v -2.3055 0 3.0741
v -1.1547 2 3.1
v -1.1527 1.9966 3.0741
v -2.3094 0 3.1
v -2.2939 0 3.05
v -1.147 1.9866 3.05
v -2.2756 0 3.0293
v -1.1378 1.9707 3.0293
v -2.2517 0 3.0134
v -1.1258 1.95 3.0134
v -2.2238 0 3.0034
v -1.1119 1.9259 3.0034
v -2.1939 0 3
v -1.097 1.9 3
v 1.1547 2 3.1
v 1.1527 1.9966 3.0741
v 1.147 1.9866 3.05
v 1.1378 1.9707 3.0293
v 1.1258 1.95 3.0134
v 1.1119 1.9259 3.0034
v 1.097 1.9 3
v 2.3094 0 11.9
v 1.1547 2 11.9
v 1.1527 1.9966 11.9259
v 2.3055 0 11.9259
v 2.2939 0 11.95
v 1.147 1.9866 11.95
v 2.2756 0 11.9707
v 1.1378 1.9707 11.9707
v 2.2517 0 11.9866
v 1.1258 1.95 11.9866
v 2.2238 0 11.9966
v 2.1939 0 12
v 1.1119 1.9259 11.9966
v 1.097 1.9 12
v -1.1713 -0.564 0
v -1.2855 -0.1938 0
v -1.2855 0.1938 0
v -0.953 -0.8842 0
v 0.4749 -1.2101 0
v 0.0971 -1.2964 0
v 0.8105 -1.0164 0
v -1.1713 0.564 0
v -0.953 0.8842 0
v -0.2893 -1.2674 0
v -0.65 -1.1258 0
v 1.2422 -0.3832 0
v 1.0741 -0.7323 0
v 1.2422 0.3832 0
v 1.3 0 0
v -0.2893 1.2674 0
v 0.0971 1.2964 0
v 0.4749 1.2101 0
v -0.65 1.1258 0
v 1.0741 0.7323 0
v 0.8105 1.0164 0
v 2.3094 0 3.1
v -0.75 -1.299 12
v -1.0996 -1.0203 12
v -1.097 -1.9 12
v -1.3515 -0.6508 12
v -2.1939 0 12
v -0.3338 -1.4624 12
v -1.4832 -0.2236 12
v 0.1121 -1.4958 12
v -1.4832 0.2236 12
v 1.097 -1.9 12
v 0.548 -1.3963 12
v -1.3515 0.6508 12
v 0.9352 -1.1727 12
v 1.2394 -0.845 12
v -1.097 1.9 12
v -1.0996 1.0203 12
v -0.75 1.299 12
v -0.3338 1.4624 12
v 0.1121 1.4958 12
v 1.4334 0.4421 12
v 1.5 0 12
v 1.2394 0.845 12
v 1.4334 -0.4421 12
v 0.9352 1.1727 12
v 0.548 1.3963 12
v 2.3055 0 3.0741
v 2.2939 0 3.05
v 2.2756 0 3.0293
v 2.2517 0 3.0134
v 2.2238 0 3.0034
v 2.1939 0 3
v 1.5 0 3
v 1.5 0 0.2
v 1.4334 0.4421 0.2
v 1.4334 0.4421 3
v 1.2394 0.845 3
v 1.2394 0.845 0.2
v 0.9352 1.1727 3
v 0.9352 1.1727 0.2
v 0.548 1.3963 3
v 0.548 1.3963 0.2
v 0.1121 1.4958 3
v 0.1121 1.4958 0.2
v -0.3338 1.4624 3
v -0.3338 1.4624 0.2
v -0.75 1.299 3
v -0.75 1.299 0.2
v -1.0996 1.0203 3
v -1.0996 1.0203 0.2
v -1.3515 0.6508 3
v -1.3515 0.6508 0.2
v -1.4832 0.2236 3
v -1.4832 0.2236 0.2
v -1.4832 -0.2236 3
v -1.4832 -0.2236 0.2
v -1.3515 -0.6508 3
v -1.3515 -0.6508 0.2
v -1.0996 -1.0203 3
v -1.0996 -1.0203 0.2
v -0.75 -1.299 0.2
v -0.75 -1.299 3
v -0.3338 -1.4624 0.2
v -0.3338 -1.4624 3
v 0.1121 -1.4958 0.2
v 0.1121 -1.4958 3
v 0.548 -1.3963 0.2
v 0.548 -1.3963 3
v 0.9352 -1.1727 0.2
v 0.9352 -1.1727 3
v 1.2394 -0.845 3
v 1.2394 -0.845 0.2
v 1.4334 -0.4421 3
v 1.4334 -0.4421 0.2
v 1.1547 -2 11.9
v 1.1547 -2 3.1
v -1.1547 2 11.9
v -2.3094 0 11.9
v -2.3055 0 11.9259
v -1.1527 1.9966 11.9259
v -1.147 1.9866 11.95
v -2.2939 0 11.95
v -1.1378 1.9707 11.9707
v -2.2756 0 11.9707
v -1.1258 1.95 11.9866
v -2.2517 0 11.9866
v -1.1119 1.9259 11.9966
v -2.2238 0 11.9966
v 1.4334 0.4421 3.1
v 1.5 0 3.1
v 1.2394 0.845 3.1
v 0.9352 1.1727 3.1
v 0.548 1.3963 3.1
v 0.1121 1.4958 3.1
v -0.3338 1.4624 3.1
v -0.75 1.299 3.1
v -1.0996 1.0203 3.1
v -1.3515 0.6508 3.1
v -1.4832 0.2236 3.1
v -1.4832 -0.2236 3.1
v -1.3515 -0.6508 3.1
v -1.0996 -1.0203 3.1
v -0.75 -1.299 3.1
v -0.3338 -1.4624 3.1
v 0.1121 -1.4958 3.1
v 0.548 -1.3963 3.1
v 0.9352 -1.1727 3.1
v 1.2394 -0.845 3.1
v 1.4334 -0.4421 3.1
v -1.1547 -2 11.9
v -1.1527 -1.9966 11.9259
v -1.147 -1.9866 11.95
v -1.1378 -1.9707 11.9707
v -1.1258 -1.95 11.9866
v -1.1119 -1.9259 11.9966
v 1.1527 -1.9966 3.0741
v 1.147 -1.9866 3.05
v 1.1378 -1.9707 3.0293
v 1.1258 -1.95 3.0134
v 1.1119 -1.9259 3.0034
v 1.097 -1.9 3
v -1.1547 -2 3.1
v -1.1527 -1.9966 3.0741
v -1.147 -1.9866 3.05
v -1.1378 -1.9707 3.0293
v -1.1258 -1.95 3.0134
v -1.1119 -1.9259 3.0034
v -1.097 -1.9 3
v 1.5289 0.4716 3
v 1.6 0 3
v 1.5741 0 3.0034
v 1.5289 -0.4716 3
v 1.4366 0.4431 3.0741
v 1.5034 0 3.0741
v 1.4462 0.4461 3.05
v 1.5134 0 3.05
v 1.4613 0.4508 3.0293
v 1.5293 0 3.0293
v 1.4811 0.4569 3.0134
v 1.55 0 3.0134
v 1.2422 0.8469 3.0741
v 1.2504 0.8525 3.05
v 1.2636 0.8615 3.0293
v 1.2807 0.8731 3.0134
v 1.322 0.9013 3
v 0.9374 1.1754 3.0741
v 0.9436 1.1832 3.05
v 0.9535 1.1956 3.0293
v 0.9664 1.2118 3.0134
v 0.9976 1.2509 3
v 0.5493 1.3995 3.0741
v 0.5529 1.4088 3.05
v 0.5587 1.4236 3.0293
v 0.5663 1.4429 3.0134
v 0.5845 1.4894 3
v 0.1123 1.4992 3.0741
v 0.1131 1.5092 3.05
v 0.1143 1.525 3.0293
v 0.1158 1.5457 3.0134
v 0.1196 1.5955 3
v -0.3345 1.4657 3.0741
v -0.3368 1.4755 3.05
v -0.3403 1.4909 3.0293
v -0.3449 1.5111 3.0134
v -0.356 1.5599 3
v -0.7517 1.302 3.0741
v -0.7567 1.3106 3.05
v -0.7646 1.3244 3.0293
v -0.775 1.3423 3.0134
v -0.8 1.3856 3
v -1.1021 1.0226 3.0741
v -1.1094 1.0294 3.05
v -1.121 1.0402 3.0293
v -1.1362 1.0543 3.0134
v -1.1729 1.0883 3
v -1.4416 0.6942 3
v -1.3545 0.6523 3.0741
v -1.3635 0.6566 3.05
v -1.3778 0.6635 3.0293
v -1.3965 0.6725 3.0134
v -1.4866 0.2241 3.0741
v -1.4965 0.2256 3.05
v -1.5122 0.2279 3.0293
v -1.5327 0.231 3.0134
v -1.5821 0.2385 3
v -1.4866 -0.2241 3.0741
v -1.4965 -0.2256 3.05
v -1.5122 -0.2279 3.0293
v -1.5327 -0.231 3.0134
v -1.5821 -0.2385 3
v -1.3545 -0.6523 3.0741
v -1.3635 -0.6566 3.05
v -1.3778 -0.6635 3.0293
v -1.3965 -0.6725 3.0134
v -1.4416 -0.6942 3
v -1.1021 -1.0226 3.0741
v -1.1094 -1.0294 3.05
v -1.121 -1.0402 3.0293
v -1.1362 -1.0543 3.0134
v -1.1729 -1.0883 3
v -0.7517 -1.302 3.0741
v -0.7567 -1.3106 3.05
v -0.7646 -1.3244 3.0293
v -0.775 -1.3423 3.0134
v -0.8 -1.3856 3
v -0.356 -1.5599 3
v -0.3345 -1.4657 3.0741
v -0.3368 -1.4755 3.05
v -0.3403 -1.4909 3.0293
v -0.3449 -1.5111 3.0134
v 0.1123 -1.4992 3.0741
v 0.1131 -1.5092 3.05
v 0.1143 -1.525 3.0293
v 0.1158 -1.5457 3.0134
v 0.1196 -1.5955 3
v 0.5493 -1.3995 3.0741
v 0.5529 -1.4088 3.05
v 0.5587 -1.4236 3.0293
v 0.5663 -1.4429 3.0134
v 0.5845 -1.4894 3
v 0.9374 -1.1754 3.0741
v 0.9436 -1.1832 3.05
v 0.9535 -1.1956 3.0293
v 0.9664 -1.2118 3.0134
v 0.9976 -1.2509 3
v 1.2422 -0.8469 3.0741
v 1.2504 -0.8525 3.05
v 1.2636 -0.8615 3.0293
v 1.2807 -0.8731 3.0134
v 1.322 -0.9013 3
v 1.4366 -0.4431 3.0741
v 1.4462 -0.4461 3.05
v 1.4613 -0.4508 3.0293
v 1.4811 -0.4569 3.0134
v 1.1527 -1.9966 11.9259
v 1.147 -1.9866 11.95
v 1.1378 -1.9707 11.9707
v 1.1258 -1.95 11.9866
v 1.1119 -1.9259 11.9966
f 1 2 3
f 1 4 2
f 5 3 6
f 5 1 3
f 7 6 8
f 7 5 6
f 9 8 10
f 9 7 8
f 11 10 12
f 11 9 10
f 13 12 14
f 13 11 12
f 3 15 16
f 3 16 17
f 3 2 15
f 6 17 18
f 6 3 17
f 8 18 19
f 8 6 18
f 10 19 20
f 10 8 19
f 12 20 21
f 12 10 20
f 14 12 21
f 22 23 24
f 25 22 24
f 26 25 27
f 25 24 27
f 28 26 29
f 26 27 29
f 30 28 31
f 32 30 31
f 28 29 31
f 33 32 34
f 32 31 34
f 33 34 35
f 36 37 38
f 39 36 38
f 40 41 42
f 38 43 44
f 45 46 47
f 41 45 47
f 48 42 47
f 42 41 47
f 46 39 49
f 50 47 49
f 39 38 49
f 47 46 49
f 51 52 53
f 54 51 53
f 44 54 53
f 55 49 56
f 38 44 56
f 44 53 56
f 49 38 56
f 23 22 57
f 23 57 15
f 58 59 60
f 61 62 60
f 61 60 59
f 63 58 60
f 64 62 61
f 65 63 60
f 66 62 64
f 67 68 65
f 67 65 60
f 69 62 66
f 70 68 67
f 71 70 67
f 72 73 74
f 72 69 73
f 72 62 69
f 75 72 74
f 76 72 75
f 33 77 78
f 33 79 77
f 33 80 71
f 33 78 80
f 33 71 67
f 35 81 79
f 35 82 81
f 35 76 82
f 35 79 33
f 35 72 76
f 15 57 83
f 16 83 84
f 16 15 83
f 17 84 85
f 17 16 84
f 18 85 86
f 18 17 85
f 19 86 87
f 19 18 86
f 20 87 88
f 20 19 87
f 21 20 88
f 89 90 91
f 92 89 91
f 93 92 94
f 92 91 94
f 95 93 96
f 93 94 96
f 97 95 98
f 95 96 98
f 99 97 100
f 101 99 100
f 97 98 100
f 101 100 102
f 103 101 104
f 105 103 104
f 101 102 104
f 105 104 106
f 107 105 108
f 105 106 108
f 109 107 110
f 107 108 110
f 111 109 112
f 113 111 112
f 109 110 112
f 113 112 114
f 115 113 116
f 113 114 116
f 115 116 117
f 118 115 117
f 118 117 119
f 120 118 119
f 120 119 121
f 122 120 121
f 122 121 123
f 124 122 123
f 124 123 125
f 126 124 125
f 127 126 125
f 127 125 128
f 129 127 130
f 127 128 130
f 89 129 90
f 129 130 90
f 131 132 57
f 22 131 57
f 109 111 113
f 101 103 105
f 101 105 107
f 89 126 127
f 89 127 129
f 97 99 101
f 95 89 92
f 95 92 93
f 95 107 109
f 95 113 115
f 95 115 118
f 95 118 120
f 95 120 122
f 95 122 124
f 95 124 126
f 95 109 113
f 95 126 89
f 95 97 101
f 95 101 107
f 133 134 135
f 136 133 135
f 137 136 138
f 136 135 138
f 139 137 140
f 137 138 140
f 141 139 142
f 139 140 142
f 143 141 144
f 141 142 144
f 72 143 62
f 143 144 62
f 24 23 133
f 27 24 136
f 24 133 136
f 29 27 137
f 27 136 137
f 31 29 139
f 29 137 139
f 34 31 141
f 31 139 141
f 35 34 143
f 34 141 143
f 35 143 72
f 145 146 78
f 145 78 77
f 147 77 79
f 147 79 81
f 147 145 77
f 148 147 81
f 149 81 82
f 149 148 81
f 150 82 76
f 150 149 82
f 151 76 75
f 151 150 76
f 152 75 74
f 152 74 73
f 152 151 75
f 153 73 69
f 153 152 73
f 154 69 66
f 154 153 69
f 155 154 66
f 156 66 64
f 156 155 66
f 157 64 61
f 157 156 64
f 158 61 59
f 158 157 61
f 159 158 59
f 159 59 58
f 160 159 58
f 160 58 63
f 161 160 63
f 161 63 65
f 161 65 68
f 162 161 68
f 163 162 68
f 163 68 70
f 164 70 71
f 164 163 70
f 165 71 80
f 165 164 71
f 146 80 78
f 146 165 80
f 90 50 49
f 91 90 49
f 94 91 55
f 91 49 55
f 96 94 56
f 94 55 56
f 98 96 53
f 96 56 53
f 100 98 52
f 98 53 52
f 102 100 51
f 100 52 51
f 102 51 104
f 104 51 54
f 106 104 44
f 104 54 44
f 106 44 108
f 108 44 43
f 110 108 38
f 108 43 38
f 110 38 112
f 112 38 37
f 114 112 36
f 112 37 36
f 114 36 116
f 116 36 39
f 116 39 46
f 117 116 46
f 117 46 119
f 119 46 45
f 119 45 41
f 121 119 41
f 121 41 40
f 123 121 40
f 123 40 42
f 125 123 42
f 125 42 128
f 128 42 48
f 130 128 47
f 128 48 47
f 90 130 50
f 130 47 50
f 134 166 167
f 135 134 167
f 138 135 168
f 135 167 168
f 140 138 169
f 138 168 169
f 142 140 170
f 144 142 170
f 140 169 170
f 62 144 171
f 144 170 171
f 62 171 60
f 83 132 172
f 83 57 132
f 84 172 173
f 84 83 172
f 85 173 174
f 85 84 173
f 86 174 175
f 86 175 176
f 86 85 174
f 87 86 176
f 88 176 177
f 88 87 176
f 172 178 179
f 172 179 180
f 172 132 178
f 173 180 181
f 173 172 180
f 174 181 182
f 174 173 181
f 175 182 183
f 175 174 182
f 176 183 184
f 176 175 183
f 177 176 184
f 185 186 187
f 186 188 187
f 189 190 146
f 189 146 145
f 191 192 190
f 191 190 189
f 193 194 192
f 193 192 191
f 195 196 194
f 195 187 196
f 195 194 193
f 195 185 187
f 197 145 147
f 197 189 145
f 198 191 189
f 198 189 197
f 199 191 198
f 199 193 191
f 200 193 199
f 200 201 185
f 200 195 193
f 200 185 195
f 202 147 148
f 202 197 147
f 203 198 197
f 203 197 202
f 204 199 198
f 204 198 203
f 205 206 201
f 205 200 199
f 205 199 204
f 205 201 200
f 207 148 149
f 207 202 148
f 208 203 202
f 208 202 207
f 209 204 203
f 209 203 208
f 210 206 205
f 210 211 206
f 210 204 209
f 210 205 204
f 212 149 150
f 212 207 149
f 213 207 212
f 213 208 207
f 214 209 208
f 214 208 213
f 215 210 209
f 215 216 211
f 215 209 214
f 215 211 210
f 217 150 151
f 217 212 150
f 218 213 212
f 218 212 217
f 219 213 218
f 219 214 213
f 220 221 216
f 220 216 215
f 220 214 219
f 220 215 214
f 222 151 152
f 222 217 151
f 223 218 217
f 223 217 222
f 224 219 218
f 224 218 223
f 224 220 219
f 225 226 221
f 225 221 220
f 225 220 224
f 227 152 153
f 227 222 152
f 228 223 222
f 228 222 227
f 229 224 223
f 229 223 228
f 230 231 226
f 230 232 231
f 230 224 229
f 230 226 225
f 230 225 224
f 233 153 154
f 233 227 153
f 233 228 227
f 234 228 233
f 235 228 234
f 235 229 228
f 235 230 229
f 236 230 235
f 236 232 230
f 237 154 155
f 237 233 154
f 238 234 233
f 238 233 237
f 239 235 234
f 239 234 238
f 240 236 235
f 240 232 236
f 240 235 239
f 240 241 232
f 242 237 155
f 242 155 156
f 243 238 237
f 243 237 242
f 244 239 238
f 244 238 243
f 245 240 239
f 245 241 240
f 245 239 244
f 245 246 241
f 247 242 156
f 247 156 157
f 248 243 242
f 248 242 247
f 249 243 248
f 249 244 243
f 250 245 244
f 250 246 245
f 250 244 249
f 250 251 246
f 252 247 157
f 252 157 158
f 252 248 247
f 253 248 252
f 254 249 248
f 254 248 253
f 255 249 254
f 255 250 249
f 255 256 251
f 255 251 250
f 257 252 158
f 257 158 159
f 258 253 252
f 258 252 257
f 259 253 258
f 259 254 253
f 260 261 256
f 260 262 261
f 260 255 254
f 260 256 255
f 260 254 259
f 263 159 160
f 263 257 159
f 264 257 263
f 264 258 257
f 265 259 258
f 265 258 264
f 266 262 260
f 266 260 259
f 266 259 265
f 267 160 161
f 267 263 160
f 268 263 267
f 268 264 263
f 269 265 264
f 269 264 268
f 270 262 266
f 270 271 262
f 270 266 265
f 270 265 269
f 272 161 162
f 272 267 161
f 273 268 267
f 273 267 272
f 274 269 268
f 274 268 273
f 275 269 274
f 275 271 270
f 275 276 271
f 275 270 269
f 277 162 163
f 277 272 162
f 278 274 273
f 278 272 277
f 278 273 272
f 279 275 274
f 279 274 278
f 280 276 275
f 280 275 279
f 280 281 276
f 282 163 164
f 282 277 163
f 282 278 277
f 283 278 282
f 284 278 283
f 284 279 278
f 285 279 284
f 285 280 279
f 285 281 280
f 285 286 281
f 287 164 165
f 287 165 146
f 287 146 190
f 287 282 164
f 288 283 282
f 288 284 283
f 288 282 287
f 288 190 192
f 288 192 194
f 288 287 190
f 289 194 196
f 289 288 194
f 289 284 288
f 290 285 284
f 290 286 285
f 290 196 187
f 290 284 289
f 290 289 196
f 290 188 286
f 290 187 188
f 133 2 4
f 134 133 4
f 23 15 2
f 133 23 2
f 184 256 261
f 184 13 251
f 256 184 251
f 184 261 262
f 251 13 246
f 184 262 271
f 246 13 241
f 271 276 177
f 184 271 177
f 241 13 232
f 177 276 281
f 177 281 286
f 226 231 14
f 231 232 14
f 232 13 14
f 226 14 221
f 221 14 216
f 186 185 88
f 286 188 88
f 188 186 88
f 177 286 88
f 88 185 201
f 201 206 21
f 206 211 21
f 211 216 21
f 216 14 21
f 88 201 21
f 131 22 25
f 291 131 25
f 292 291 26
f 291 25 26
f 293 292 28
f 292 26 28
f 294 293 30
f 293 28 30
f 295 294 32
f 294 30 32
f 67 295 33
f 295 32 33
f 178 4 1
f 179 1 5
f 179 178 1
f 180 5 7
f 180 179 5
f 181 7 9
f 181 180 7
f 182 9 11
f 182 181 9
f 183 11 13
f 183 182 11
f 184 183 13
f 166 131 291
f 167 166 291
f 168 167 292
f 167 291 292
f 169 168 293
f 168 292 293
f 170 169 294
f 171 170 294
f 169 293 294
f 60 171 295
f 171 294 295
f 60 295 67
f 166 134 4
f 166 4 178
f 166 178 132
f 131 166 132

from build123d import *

# Parameters (mm, degrees)
SKICA1_R                = 1.5
P_IDAT_VYSUNUT_M1_DEPTH = 3
SKICA2_R                = 1.5
P_IDAT_VYSUNUT_M2_DEPTH = 9
ZKOSEN_1_SIZE           = 0.2
ZAOBLIT1_R              = 0.1


with BuildPart() as part:
    # Skica1 → Přidat vysunutím1 (new body)
    with BuildSketch(Plane.XY):
        Circle(SKICA1_R)
    extrude(amount=P_IDAT_VYSUNUT_M1_DEPTH)

    # Zkosení1
    zkosen_1_edges = [part.edges().sort_by_distance(p)[0] for p in [
        (-1.5, 0, 0),
    ]]
    chamfer(zkosen_1_edges, length=ZKOSEN_1_SIZE)


with BuildPart() as body_2:
    # Skica2 → Přidat vysunutím2 (new body)
    with BuildSketch(Plane.XY.offset(3)):
        Polygon((2.309401077, 0), (1.154700538, 2), (-1.154700538, 2), (-2.309401077, 0), (-1.154700538, -2), (1.154700538, -2), align=None)
        Circle(SKICA2_R, mode=Mode.SUBTRACT)
    extrude(amount=P_IDAT_VYSUNUT_M2_DEPTH)

    # Zaoblit1
    zaoblit1_edges = [body_2.edges().sort_by_distance(p)[0] for p in [
        (0, 2, 12),
        (-1.732050808, 1, 12),
        (-1.5, 0, 3),
        (-1.732050808, -1, 12),
        (0, -2, 12),
        (1.732050808, -1, 12),
        (0, -2, 3),
        (-1.732050808, -1, 3),
        (-1.732050808, 1, 3),
        (0, 2, 3),
        (1.732050808, 1, 3),
        (1.732050808, -1, 3),
        (1.732050808, 1, 12),
    ]]
    fillet(zaoblit1_edges, radius=ZAOBLIT1_R)


solid = Compound([part.part, body_2.part])
